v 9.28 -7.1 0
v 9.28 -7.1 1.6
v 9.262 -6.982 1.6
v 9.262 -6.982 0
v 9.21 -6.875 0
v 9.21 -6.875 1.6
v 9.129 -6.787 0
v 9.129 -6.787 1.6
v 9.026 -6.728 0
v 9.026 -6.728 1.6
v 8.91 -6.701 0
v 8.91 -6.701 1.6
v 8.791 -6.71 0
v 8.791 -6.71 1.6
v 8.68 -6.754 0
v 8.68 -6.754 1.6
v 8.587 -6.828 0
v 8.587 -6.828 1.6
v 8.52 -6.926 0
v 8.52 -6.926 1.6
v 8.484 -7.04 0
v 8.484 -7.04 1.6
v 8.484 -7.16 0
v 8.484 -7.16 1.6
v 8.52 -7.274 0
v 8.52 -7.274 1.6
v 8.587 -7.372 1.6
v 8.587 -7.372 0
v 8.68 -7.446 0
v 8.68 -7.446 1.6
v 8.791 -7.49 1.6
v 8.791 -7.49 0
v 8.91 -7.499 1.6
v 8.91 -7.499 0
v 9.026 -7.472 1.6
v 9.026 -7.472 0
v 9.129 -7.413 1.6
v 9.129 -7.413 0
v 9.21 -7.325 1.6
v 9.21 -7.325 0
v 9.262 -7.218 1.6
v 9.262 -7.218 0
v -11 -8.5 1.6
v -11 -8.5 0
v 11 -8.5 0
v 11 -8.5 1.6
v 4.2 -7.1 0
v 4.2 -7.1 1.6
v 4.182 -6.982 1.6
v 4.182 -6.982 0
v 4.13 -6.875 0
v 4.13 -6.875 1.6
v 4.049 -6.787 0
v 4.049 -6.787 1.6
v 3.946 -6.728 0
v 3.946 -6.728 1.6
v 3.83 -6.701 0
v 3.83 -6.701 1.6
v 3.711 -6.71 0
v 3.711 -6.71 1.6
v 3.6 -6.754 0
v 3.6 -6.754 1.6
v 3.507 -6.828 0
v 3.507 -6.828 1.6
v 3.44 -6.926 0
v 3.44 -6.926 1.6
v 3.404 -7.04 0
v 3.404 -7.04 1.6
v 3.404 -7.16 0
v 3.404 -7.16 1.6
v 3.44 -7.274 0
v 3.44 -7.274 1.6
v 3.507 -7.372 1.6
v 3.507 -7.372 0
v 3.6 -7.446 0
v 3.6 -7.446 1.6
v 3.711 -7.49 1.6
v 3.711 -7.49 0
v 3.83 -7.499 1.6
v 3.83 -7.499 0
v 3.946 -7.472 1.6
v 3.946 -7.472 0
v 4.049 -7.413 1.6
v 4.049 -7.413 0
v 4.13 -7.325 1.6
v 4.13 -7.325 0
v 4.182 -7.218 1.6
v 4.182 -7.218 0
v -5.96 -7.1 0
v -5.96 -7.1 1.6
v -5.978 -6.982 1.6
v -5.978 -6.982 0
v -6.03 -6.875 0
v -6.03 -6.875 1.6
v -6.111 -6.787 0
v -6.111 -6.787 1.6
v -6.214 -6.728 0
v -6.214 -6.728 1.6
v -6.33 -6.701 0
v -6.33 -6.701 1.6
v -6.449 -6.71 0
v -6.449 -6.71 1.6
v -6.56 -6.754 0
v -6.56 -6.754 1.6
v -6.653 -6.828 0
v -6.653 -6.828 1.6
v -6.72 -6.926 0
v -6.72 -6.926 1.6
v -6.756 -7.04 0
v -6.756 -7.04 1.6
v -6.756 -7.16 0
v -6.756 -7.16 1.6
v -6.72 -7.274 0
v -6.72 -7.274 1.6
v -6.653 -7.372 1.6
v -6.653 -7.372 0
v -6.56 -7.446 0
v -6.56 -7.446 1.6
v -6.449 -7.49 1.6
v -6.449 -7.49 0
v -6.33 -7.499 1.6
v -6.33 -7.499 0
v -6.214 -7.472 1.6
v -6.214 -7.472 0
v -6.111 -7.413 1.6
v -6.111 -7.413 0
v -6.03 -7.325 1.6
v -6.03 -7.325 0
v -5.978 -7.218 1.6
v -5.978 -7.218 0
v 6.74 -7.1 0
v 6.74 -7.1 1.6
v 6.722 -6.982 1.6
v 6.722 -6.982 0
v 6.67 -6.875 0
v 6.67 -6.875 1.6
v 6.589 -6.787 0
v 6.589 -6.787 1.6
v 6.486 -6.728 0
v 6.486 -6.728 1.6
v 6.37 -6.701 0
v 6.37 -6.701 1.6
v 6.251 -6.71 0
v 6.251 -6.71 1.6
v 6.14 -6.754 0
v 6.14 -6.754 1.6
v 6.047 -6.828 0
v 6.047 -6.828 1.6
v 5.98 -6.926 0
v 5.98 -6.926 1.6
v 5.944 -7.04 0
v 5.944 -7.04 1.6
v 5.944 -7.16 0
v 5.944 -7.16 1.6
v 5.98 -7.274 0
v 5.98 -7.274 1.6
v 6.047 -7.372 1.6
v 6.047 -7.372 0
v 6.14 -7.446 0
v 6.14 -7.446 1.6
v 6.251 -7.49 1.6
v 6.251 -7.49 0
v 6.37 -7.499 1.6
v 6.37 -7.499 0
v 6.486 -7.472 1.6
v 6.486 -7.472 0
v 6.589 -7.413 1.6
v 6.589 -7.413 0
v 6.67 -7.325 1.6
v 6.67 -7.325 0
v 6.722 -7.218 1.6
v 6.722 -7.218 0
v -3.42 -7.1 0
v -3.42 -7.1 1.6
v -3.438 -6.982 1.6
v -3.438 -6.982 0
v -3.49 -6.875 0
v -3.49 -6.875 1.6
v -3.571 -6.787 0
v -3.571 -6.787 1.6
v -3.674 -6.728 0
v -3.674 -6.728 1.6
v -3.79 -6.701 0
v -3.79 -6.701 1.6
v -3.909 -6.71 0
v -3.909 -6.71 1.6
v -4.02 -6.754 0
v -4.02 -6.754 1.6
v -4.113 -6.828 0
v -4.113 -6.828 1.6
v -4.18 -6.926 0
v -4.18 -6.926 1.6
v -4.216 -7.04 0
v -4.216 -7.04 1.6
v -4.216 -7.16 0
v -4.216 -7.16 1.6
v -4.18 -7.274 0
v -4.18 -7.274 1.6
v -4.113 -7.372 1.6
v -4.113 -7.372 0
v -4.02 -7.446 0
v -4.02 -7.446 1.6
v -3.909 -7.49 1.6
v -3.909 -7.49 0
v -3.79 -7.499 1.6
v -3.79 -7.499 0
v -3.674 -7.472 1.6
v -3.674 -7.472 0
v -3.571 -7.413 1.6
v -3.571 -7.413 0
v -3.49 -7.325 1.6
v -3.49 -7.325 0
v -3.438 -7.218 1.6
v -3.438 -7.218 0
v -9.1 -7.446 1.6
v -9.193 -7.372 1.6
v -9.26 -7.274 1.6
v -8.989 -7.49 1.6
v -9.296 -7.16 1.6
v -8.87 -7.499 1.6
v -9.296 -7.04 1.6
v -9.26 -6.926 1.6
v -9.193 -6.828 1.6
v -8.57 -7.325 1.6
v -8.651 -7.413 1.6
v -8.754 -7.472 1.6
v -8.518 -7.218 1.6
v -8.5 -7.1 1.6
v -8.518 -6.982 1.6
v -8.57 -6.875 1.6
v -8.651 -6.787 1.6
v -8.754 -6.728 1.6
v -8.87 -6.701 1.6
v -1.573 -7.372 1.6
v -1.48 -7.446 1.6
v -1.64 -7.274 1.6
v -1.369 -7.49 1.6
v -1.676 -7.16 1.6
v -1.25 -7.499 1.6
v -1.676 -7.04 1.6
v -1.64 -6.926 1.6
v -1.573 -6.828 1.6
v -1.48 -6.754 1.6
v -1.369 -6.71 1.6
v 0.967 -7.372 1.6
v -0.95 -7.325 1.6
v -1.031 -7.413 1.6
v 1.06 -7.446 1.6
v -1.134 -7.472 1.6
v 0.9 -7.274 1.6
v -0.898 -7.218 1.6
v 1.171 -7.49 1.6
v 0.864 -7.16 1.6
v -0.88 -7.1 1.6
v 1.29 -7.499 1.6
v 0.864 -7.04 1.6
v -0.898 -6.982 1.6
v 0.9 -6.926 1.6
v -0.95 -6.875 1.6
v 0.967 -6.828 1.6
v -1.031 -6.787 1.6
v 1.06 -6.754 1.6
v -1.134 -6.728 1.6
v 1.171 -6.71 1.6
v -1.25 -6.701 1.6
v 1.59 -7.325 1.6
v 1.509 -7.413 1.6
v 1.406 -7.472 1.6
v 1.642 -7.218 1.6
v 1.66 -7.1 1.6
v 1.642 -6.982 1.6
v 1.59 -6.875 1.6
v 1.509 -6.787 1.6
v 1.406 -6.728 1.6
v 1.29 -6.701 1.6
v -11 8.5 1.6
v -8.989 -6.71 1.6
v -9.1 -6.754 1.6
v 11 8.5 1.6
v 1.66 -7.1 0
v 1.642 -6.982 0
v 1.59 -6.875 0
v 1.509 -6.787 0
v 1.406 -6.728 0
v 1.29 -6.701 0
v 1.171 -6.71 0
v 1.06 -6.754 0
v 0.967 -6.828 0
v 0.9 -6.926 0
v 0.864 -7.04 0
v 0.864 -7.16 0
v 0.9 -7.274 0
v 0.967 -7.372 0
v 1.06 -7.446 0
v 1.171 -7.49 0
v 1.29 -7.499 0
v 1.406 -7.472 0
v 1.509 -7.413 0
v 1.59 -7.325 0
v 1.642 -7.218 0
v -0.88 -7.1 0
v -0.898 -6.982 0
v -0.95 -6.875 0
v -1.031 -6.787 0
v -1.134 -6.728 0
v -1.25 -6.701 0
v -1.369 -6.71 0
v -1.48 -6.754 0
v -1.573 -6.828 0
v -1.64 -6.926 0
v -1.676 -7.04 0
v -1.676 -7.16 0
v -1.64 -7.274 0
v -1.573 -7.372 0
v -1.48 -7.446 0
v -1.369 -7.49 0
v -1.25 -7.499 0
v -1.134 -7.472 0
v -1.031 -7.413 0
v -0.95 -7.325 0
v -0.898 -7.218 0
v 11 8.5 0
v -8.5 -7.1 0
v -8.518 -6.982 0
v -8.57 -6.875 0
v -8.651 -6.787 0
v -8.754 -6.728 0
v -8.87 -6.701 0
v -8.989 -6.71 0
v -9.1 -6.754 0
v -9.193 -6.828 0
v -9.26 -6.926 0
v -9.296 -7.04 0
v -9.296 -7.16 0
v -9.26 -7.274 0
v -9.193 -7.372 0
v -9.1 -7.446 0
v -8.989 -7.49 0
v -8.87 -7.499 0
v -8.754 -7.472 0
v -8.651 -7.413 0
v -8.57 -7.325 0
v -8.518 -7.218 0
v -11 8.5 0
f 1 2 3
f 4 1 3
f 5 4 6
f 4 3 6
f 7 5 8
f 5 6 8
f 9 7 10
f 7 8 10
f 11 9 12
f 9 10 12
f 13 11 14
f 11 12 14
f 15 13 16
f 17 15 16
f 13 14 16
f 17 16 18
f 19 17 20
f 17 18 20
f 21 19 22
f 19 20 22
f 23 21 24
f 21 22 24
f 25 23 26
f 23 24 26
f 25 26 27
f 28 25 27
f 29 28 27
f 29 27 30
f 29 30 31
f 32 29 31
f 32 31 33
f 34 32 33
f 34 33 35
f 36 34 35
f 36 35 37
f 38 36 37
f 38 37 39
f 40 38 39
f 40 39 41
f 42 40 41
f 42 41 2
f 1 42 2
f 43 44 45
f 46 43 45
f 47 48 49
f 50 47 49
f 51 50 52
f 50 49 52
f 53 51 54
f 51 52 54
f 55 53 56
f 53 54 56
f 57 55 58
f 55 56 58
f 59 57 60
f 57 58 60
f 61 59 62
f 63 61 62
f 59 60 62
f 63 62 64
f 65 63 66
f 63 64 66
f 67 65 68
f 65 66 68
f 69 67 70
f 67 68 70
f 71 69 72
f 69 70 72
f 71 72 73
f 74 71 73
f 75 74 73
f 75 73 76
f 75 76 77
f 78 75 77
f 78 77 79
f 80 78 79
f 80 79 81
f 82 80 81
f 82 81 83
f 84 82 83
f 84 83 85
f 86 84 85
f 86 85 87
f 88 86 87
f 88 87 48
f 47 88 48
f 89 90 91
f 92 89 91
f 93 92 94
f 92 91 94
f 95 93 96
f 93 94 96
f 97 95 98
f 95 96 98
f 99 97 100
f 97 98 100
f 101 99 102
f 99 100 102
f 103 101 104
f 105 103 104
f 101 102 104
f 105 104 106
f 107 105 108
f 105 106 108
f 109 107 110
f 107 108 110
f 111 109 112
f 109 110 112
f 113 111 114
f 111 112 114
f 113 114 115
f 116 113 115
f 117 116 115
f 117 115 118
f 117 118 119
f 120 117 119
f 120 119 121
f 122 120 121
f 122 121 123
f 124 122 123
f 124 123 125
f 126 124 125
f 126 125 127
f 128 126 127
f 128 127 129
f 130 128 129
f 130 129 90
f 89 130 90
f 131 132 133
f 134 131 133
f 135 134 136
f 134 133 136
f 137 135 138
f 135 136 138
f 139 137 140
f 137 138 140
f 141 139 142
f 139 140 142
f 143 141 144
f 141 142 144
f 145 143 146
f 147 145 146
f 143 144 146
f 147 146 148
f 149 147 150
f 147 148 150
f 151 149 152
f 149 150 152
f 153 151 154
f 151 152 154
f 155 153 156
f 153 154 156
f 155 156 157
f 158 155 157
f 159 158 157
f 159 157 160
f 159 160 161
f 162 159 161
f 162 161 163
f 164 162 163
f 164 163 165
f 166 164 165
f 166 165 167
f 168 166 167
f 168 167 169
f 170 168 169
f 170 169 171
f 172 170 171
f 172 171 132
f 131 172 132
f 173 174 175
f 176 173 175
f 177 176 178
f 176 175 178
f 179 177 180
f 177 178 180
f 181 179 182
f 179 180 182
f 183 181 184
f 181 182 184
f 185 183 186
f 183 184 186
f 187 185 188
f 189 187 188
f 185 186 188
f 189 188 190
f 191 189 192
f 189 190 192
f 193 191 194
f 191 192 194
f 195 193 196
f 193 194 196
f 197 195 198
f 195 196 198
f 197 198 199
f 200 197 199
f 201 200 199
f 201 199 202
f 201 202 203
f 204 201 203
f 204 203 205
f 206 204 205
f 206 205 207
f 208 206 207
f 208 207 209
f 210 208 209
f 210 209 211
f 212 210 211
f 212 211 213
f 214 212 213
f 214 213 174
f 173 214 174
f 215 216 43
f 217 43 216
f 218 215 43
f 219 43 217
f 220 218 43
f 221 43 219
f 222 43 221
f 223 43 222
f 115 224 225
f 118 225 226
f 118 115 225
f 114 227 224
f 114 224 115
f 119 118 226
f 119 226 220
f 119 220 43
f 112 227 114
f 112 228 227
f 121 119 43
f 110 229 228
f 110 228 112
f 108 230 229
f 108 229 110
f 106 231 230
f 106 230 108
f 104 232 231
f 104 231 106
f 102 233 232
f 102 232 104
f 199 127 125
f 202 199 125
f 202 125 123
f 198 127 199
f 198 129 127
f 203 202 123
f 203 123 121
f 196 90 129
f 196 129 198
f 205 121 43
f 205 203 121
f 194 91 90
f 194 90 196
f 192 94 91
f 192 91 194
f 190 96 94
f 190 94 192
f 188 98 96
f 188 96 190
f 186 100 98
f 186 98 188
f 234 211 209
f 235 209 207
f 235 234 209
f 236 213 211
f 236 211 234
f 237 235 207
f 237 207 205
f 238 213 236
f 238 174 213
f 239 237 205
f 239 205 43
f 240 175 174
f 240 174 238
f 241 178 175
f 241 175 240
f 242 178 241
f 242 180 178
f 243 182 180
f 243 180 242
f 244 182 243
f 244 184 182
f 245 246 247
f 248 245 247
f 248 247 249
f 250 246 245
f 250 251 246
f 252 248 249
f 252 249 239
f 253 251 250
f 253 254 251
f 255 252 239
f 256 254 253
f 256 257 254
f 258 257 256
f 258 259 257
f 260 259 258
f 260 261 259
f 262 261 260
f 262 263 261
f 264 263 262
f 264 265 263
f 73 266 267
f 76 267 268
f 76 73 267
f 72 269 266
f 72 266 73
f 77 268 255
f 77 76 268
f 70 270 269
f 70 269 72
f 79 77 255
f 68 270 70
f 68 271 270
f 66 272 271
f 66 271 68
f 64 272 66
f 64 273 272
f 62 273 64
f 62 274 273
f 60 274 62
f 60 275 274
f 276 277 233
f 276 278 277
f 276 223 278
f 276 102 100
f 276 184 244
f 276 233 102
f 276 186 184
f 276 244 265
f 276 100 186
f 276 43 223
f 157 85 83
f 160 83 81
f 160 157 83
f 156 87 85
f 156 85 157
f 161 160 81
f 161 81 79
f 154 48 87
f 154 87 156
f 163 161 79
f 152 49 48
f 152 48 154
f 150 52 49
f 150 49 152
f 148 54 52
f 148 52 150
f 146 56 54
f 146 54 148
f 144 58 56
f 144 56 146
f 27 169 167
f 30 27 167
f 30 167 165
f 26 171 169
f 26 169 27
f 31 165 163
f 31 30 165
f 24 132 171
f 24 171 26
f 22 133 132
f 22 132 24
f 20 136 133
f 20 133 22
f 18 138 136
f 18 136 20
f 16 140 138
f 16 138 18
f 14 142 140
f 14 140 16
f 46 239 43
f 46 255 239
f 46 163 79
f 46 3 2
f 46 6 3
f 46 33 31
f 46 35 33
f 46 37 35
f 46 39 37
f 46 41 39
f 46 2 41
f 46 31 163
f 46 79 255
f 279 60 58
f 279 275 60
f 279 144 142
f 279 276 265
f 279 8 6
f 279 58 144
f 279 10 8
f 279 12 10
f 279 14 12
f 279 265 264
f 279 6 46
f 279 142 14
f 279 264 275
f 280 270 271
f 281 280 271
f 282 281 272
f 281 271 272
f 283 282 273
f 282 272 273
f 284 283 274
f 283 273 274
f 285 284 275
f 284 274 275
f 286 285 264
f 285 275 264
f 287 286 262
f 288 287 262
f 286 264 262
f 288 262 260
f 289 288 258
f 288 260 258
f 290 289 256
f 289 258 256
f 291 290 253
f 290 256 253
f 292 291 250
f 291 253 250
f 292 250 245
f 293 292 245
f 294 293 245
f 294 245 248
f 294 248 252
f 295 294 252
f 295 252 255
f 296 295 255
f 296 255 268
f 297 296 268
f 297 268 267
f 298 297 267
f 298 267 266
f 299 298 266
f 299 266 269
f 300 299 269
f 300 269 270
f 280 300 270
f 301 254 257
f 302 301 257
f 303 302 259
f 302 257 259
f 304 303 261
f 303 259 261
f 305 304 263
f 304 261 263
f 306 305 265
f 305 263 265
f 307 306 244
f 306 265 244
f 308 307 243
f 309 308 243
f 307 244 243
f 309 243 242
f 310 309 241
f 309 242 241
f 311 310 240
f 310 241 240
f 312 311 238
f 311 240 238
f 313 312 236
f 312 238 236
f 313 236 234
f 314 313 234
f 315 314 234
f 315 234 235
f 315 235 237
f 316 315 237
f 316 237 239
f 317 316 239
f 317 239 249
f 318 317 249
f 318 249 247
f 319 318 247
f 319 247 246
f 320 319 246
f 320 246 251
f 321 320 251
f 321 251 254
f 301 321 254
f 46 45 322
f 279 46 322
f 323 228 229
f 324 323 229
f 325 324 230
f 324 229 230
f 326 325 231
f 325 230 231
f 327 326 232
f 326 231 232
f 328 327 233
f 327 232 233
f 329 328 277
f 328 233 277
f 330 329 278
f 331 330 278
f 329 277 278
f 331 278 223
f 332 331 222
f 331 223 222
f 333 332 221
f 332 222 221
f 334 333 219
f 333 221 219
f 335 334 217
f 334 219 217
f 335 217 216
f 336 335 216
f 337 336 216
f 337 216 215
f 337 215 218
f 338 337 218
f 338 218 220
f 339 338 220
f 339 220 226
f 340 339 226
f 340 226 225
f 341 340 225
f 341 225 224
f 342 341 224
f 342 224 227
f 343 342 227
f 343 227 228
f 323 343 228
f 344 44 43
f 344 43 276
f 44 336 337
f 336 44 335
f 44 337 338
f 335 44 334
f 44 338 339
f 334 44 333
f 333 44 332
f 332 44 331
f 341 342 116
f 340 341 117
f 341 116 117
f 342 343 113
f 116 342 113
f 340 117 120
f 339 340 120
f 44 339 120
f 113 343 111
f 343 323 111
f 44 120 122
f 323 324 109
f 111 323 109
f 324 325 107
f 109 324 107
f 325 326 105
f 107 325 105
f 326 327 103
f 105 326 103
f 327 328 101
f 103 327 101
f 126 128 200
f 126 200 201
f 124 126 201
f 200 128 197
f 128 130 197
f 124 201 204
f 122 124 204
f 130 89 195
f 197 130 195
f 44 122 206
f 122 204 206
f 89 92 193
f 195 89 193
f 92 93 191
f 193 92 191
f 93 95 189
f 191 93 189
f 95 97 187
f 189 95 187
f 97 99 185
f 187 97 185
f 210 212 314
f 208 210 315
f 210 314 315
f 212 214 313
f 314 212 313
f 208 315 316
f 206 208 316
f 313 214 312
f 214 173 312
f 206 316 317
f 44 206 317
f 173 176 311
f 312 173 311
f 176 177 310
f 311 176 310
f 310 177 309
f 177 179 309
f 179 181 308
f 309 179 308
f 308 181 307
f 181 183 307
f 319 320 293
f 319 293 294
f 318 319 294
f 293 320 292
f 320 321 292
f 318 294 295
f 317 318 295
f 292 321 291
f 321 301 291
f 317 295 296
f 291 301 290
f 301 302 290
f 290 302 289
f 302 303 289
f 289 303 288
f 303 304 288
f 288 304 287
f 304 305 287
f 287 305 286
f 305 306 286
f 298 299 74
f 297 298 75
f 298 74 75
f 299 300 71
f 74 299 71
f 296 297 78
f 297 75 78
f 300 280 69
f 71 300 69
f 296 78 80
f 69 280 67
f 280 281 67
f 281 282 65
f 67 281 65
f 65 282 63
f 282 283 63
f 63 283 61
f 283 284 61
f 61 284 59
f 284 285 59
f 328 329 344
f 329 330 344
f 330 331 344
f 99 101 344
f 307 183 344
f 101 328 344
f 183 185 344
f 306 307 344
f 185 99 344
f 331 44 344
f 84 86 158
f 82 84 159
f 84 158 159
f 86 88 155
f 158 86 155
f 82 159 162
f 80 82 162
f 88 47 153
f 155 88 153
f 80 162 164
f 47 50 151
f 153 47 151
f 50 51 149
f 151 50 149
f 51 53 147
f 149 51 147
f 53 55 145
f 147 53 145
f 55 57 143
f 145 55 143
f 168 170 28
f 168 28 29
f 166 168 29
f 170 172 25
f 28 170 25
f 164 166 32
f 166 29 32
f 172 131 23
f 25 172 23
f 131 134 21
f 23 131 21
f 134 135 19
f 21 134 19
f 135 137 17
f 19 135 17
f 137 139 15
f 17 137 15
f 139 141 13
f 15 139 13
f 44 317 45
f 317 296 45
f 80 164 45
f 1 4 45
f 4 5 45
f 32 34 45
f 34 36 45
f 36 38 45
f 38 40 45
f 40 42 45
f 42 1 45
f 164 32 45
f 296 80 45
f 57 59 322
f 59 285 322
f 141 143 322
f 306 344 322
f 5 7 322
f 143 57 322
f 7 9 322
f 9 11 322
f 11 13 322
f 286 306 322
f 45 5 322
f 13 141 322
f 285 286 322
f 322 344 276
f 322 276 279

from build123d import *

# Parameters (mm, degrees)
SKETCH1_W           = 22
SKETCH1_H           = 17
BOSS_EXTRUDE1_DEPTH = 1.6
CUT_EXTRUDE1_REACH  = 3.6
SKETCH2_R           = 0.4


with BuildPart() as part:
    # Sketch1 → Boss-Extrude1 (new body)
    with BuildSketch(Plane.XY):
        Rectangle(SKETCH1_W, SKETCH1_H)
    extrude(amount=BOSS_EXTRUDE1_DEPTH)

    # Sketch2 → Cut-Extrude1 (cut, up to next)
    with BuildSketch(Plane.XY.offset(1.6), mode=Mode.PRIVATE) as cut_extrude1_sk1:
        with Locations((-8.9, -7.1)):
            Circle(SKETCH2_R)
    cut_extrude1_tool1 = extrude(cut_extrude1_sk1.sketch, amount=-CUT_EXTRUDE1_REACH, mode=Mode.PRIVATE) & part.part
    add(cut_extrude1_tool1.solids().sort_by_distance((-8.9, -7.1, 1.6))[0], mode=Mode.SUBTRACT)
    # Sketch2 → Cut-Extrude1 (cut, up to next)
    with BuildSketch(Plane.XY.offset(1.6), mode=Mode.PRIVATE) as cut_extrude1_sk2:
        with Locations((-6.36, -7.1)):
            Circle(SKETCH2_R)
    cut_extrude1_tool2 = extrude(cut_extrude1_sk2.sketch, amount=-CUT_EXTRUDE1_REACH, mode=Mode.PRIVATE) & part.part
    add(cut_extrude1_tool2.solids().sort_by_distance((-6.36, -7.1, 1.6))[0], mode=Mode.SUBTRACT)
    # Sketch2 → Cut-Extrude1 (cut, up to next)
    with BuildSketch(Plane.XY.offset(1.6), mode=Mode.PRIVATE) as cut_extrude1_sk3:
        with Locations((-3.82, -7.1)):
            Circle(SKETCH2_R)
    cut_extrude1_tool3 = extrude(cut_extrude1_sk3.sketch, amount=-CUT_EXTRUDE1_REACH, mode=Mode.PRIVATE) & part.part
    add(cut_extrude1_tool3.solids().sort_by_distance((-3.82, -7.1, 1.6))[0], mode=Mode.SUBTRACT)
    # Sketch2 → Cut-Extrude1 (cut, up to next)
    with BuildSketch(Plane.XY.offset(1.6), mode=Mode.PRIVATE) as cut_extrude1_sk4:
        with Locations((-1.28, -7.1)):
            Circle(SKETCH2_R)
    cut_extrude1_tool4 = extrude(cut_extrude1_sk4.sketch, amount=-CUT_EXTRUDE1_REACH, mode=Mode.PRIVATE) & part.part
    add(cut_extrude1_tool4.solids().sort_by_distance((-1.28, -7.1, 1.6))[0], mode=Mode.SUBTRACT)
    # Sketch2 → Cut-Extrude1 (cut, up to next)
    with BuildSketch(Plane.XY.offset(1.6), mode=Mode.PRIVATE) as cut_extrude1_sk5:
        with Locations((1.26, -7.1)):
            Circle(SKETCH2_R)
    cut_extrude1_tool5 = extrude(cut_extrude1_sk5.sketch, amount=-CUT_EXTRUDE1_REACH, mode=Mode.PRIVATE) & part.part
    add(cut_extrude1_tool5.solids().sort_by_distance((1.26, -7.1, 1.6))[0], mode=Mode.SUBTRACT)
    # Sketch2 → Cut-Extrude1 (cut, up to next)
    with BuildSketch(Plane.XY.offset(1.6), mode=Mode.PRIVATE) as cut_extrude1_sk6:
        with Locations((3.8, -7.1)):
            Circle(SKETCH2_R)
    cut_extrude1_tool6 = extrude(cut_extrude1_sk6.sketch, amount=-CUT_EXTRUDE1_REACH, mode=Mode.PRIVATE) & part.part
    add(cut_extrude1_tool6.solids().sort_by_distance((3.8, -7.1, 1.6))[0], mode=Mode.SUBTRACT)
    # Sketch2 → Cut-Extrude1 (cut, up to next)
    with BuildSketch(Plane.XY.offset(1.6), mode=Mode.PRIVATE) as cut_extrude1_sk7:
        with Locations((6.34, -7.1)):
            Circle(SKETCH2_R)
    cut_extrude1_tool7 = extrude(cut_extrude1_sk7.sketch, amount=-CUT_EXTRUDE1_REACH, mode=Mode.PRIVATE) & part.part
    add(cut_extrude1_tool7.solids().sort_by_distance((6.34, -7.1, 1.6))[0], mode=Mode.SUBTRACT)
    # Sketch2 → Cut-Extrude1 (cut, up to next)
    with BuildSketch(Plane.XY.offset(1.6), mode=Mode.PRIVATE) as cut_extrude1_sk8:
        with Locations((8.88, -7.1)):
            Circle(SKETCH2_R)
    cut_extrude1_tool8 = extrude(cut_extrude1_sk8.sketch, amount=-CUT_EXTRUDE1_REACH, mode=Mode.PRIVATE) & part.part
    add(cut_extrude1_tool8.solids().sort_by_distance((8.88, -7.1, 1.6))[0], mode=Mode.SUBTRACT)


solid = part.part
